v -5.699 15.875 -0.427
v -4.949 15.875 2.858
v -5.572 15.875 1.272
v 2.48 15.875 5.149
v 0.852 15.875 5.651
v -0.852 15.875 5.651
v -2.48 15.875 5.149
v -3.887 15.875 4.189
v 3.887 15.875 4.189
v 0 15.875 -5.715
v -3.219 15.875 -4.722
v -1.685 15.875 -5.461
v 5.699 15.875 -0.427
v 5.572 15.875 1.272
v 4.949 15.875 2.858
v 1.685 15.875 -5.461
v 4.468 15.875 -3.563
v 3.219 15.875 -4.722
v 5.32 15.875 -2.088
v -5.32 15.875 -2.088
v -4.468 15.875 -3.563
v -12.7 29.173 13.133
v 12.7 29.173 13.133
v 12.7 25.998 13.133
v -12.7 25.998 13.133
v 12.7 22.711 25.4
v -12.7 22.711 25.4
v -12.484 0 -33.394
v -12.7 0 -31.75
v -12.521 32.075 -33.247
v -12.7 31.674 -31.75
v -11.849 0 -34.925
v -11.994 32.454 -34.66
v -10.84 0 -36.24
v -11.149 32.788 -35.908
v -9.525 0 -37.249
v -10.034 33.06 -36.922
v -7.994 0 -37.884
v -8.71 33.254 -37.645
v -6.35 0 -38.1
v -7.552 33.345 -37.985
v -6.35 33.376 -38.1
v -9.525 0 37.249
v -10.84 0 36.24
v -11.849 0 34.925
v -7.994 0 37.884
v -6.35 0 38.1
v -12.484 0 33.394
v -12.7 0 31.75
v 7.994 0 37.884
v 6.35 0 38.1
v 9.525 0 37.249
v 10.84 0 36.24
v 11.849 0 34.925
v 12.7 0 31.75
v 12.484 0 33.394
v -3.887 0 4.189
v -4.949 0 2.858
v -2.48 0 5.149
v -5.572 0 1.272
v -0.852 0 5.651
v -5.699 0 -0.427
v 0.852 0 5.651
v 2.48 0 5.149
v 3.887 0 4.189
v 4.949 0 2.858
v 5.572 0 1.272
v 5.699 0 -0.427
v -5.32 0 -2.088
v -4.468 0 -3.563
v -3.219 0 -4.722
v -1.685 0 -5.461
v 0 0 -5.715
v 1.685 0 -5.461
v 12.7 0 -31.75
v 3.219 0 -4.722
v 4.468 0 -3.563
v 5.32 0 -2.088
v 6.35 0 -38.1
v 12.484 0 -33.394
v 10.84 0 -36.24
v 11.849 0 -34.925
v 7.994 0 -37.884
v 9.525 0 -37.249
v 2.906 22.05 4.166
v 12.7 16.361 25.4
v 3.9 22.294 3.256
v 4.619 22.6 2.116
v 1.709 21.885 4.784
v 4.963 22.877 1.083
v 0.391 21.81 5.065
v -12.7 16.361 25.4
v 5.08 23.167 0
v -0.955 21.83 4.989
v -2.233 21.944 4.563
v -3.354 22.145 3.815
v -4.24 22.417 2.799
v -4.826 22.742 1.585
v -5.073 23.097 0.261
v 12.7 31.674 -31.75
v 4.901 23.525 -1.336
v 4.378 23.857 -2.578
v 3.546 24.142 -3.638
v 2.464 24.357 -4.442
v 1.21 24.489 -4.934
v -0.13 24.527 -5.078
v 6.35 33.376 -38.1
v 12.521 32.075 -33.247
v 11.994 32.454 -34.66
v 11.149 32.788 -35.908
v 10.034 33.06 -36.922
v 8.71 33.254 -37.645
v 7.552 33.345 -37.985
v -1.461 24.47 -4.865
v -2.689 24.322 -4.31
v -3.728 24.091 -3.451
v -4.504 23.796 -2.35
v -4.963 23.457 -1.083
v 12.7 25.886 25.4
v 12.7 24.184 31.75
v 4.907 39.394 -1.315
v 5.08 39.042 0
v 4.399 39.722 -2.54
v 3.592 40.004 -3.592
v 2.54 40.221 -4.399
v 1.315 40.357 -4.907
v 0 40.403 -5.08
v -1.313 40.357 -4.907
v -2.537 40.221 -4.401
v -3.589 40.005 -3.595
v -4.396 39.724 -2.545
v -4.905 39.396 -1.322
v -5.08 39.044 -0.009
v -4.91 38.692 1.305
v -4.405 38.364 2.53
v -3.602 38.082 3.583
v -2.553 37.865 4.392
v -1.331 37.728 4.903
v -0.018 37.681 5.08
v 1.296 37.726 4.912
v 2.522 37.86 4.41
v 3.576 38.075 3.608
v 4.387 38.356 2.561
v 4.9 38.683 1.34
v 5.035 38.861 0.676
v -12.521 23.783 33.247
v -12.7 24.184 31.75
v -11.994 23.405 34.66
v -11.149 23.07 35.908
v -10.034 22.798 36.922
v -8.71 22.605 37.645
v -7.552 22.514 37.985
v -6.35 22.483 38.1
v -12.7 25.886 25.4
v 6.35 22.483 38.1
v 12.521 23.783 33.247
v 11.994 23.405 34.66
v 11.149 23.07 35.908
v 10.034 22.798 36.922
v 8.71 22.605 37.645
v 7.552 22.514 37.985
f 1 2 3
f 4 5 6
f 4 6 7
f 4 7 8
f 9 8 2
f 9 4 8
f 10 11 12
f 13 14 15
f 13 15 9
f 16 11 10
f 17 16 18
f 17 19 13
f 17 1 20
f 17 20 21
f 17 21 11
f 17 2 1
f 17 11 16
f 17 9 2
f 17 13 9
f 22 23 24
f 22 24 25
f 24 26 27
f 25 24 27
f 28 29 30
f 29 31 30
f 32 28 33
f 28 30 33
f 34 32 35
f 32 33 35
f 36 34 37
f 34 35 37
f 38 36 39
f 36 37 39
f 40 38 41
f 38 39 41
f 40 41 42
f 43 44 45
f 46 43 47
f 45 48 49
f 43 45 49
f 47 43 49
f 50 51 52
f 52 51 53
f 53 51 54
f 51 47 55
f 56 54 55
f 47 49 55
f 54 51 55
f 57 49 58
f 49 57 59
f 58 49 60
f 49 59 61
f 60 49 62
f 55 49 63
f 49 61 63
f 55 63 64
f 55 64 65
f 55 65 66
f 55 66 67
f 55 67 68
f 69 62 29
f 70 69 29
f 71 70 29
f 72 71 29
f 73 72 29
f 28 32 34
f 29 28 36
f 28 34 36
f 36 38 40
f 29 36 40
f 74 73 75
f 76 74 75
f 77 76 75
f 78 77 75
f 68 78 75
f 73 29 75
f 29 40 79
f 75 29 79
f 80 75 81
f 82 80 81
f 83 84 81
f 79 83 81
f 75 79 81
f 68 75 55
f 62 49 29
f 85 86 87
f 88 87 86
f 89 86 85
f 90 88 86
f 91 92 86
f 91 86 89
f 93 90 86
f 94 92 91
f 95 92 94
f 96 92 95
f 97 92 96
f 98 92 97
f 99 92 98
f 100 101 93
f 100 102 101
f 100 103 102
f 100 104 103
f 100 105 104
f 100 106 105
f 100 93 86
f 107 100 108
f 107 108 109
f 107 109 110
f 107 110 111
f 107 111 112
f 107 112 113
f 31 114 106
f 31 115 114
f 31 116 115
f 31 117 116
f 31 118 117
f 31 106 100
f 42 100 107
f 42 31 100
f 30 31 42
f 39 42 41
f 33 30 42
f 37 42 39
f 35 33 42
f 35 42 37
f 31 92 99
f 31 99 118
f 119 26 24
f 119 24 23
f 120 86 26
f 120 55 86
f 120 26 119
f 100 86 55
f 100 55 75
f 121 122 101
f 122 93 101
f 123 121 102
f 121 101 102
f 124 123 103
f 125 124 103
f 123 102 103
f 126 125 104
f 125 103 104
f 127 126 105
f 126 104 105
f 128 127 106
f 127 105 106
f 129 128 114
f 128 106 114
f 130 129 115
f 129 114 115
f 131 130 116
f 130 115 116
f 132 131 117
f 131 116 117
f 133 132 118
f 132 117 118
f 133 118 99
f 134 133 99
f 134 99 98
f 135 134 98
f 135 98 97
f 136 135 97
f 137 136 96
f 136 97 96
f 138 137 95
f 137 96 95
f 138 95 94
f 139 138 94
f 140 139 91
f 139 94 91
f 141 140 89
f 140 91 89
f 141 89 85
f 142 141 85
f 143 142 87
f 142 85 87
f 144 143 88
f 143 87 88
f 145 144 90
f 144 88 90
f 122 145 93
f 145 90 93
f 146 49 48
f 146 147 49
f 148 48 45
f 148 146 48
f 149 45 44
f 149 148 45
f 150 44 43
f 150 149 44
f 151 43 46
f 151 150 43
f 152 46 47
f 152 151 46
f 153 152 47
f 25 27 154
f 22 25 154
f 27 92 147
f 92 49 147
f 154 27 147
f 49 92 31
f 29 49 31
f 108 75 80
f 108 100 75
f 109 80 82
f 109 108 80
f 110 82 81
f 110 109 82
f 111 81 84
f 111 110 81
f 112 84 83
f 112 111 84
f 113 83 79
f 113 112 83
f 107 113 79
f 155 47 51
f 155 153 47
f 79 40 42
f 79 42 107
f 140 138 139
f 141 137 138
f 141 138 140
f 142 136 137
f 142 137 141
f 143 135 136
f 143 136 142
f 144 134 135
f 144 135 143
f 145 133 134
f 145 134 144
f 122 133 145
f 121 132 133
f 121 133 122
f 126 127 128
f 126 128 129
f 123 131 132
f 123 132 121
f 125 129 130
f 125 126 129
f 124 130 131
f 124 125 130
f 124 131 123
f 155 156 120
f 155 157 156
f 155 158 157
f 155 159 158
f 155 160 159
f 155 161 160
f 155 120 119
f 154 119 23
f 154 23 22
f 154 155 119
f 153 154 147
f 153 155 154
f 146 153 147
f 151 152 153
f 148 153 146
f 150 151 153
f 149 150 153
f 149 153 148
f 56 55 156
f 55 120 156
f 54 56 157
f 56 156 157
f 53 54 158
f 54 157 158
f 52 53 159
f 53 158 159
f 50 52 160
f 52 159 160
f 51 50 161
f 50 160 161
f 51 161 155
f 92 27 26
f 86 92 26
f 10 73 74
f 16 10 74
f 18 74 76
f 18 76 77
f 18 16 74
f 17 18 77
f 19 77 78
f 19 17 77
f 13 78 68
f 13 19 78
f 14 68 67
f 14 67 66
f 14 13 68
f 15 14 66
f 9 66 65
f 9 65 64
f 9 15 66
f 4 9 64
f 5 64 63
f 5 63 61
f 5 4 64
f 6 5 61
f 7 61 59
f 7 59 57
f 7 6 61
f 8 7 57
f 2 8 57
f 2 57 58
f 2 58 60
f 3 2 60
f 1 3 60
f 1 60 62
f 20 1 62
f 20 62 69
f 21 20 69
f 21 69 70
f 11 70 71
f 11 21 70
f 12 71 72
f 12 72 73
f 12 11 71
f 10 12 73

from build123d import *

# Parameters (mm, degrees)
SKETCH1_W               = 25.4
SKETCH1_H               = 76.2
BOSS_EXTRUDE1_DEPTH     = 33.3756
CUT_EXTRUDE2_DEPTH      = 57.663045059
CUT_EXTRUDE2_DEPTH_BACK = 57.663045059
BOSS_EXTRUDE2_REACH     = 63.744
SKETCH1_5_W             = 25.4
SKETCH1_5_H             = 12.7
SKETCH7_W               = 25.4
SKETCH7_H               = 3.175
BOSS_EXTRUDE3_DEPTH     = 12.7
FILLET1_R               = 6.35
BOSS_EXTRUDE4_REACH     = 70.094
SKETCH8_R               = 5.08
SKETCH8_3_R             = 5.715
CUT_EXTRUDE4_DEPTH      = 15.875


with BuildPart() as part:
    # Sketch1 → Boss-Extrude1 (new body)
    with BuildSketch(Plane(origin=(0, 0, 0), x_dir=(1, 0, 0), z_dir=(0, 1, 0))):
        Rectangle(SKETCH1_W, SKETCH1_H)
    extrude(amount=BOSS_EXTRUDE1_DEPTH)

    # Sketch4 → Cut-Extrude2 (cut, two sides: drawn at the far end of the back side and taken through both)
    with BuildSketch(Plane(origin=(12.7, 0, 0), x_dir=(0, 0, -1), z_dir=(1, 0, 0)).offset(-CUT_EXTRUDE2_DEPTH_BACK)):
        Polygon((38.1, 33.3756), (-38.1, 33.3756), (-38.1, 12.957871537), align=None)
    extrude(amount=CUT_EXTRUDE2_DEPTH + CUT_EXTRUDE2_DEPTH_BACK, mode=Mode.SUBTRACT)

    # Boss-Extrude2: from a plane face, 63.744 long prism both ways, kept between that surface and its translate by the depth
    boss_extrude2_start = Plane(origin=(-12.7, 12.957871537, 38.1), z_dir=(0, -0.9659258262890681, -0.2588190451025217)) * Box(256.976, 256.976, 128.488, align=(Align.CENTER, Align.CENTER, Align.MIN), mode=Mode.PRIVATE)
    boss_extrude2_end = Plane(origin=(-12.7, 22.482871537, 38.1), z_dir=(0, -0.9659258262890681, -0.2588190451025217)) * Box(256.976, 256.976, 128.488, align=(Align.CENTER, Align.CENTER, Align.MIN), mode=Mode.PRIVATE)
    # Sketch1<5> → Boss-Extrude2 (add, from a surface)
    with BuildSketch(Plane(origin=(0, 0, 0), x_dir=(1, 0, 0), z_dir=(0, 1, 0)), mode=Mode.PRIVATE) as boss_extrude2_sk1:
        with Locations((0, -31.75)):
            Rectangle(SKETCH1_5_W, SKETCH1_5_H)
    boss_extrude2_tool1 = extrude(boss_extrude2_sk1.sketch, amount=BOSS_EXTRUDE2_REACH, both=True, mode=Mode.PRIVATE)
    add(((boss_extrude2_tool1 - boss_extrude2_start) & boss_extrude2_end).solids().sort_by_distance((-3.175, 25.718952, -9.525))[0])

    # Sketch7 → Boss-Extrude3 (add, along a direction that is not the sketch's normal)
    with BuildSketch(Plane(origin=(0, 0, 25.4), x_dir=(-1, 0, 0), z_dir=(0, 0, -1))):
        with Locations((0, 24.298326281)):
            Rectangle(SKETCH7_W, SKETCH7_H)
    extrude(amount=BOSS_EXTRUDE3_DEPTH, dir=(0, 0.2588190451025216, -0.965925826289068))

    # Fillet1
    fillet1_edges = [part.edges().sort_by_distance(p)[0] for p in [
        (-12.7, 16.6878, -38.1),
        (-12.7, 11.241435768, 38.1),
        (12.7, 16.6878, -38.1),
        (12.7, 11.241435768, 38.1),
    ]]
    fillet(fillet1_edges, radius=FILLET1_R)

    # Boss-Extrude4: from a plane face, 70.094 long prism both ways, kept between that surface and its translate by the depth
    boss_extrude4_start = Plane(origin=(-12.7, 12.957871537, 38.1), z_dir=(0, -0.9659258262890681, -0.2588190451025217)) * Box(282.376, 282.376, 141.188, align=(Align.CENTER, Align.CENTER, Align.MIN), mode=Mode.PRIVATE)
    boss_extrude4_end = Plane(origin=(-12.7, 28.832871537, 38.1), z_dir=(0, -0.9659258262890681, -0.2588190451025217)) * Box(282.376, 282.376, 141.188, align=(Align.CENTER, Align.CENTER, Align.MIN), mode=Mode.PRIVATE)
    # Sketch8 → Boss-Extrude4 (add, from a surface)
    with BuildSketch(Plane.XZ, mode=Mode.PRIVATE) as boss_extrude4_sk1:
        Circle(SKETCH8_R)
    boss_extrude4_tool1 = extrude(boss_extrude4_sk1.sketch, amount=BOSS_EXTRUDE4_REACH, both=True, mode=Mode.PRIVATE)
    add(((boss_extrude4_tool1 - boss_extrude4_start) & boss_extrude4_end).solids().sort_by_distance((-1.058333, 28.53042, -20.017543))[0])

    # Sketch8<3> → Cut-Extrude4 (cut)
    with BuildSketch(Plane.XZ):
        Circle(SKETCH8_3_R)
    extrude(amount=-CUT_EXTRUDE4_DEPTH, mode=Mode.SUBTRACT)


solid = part.part
